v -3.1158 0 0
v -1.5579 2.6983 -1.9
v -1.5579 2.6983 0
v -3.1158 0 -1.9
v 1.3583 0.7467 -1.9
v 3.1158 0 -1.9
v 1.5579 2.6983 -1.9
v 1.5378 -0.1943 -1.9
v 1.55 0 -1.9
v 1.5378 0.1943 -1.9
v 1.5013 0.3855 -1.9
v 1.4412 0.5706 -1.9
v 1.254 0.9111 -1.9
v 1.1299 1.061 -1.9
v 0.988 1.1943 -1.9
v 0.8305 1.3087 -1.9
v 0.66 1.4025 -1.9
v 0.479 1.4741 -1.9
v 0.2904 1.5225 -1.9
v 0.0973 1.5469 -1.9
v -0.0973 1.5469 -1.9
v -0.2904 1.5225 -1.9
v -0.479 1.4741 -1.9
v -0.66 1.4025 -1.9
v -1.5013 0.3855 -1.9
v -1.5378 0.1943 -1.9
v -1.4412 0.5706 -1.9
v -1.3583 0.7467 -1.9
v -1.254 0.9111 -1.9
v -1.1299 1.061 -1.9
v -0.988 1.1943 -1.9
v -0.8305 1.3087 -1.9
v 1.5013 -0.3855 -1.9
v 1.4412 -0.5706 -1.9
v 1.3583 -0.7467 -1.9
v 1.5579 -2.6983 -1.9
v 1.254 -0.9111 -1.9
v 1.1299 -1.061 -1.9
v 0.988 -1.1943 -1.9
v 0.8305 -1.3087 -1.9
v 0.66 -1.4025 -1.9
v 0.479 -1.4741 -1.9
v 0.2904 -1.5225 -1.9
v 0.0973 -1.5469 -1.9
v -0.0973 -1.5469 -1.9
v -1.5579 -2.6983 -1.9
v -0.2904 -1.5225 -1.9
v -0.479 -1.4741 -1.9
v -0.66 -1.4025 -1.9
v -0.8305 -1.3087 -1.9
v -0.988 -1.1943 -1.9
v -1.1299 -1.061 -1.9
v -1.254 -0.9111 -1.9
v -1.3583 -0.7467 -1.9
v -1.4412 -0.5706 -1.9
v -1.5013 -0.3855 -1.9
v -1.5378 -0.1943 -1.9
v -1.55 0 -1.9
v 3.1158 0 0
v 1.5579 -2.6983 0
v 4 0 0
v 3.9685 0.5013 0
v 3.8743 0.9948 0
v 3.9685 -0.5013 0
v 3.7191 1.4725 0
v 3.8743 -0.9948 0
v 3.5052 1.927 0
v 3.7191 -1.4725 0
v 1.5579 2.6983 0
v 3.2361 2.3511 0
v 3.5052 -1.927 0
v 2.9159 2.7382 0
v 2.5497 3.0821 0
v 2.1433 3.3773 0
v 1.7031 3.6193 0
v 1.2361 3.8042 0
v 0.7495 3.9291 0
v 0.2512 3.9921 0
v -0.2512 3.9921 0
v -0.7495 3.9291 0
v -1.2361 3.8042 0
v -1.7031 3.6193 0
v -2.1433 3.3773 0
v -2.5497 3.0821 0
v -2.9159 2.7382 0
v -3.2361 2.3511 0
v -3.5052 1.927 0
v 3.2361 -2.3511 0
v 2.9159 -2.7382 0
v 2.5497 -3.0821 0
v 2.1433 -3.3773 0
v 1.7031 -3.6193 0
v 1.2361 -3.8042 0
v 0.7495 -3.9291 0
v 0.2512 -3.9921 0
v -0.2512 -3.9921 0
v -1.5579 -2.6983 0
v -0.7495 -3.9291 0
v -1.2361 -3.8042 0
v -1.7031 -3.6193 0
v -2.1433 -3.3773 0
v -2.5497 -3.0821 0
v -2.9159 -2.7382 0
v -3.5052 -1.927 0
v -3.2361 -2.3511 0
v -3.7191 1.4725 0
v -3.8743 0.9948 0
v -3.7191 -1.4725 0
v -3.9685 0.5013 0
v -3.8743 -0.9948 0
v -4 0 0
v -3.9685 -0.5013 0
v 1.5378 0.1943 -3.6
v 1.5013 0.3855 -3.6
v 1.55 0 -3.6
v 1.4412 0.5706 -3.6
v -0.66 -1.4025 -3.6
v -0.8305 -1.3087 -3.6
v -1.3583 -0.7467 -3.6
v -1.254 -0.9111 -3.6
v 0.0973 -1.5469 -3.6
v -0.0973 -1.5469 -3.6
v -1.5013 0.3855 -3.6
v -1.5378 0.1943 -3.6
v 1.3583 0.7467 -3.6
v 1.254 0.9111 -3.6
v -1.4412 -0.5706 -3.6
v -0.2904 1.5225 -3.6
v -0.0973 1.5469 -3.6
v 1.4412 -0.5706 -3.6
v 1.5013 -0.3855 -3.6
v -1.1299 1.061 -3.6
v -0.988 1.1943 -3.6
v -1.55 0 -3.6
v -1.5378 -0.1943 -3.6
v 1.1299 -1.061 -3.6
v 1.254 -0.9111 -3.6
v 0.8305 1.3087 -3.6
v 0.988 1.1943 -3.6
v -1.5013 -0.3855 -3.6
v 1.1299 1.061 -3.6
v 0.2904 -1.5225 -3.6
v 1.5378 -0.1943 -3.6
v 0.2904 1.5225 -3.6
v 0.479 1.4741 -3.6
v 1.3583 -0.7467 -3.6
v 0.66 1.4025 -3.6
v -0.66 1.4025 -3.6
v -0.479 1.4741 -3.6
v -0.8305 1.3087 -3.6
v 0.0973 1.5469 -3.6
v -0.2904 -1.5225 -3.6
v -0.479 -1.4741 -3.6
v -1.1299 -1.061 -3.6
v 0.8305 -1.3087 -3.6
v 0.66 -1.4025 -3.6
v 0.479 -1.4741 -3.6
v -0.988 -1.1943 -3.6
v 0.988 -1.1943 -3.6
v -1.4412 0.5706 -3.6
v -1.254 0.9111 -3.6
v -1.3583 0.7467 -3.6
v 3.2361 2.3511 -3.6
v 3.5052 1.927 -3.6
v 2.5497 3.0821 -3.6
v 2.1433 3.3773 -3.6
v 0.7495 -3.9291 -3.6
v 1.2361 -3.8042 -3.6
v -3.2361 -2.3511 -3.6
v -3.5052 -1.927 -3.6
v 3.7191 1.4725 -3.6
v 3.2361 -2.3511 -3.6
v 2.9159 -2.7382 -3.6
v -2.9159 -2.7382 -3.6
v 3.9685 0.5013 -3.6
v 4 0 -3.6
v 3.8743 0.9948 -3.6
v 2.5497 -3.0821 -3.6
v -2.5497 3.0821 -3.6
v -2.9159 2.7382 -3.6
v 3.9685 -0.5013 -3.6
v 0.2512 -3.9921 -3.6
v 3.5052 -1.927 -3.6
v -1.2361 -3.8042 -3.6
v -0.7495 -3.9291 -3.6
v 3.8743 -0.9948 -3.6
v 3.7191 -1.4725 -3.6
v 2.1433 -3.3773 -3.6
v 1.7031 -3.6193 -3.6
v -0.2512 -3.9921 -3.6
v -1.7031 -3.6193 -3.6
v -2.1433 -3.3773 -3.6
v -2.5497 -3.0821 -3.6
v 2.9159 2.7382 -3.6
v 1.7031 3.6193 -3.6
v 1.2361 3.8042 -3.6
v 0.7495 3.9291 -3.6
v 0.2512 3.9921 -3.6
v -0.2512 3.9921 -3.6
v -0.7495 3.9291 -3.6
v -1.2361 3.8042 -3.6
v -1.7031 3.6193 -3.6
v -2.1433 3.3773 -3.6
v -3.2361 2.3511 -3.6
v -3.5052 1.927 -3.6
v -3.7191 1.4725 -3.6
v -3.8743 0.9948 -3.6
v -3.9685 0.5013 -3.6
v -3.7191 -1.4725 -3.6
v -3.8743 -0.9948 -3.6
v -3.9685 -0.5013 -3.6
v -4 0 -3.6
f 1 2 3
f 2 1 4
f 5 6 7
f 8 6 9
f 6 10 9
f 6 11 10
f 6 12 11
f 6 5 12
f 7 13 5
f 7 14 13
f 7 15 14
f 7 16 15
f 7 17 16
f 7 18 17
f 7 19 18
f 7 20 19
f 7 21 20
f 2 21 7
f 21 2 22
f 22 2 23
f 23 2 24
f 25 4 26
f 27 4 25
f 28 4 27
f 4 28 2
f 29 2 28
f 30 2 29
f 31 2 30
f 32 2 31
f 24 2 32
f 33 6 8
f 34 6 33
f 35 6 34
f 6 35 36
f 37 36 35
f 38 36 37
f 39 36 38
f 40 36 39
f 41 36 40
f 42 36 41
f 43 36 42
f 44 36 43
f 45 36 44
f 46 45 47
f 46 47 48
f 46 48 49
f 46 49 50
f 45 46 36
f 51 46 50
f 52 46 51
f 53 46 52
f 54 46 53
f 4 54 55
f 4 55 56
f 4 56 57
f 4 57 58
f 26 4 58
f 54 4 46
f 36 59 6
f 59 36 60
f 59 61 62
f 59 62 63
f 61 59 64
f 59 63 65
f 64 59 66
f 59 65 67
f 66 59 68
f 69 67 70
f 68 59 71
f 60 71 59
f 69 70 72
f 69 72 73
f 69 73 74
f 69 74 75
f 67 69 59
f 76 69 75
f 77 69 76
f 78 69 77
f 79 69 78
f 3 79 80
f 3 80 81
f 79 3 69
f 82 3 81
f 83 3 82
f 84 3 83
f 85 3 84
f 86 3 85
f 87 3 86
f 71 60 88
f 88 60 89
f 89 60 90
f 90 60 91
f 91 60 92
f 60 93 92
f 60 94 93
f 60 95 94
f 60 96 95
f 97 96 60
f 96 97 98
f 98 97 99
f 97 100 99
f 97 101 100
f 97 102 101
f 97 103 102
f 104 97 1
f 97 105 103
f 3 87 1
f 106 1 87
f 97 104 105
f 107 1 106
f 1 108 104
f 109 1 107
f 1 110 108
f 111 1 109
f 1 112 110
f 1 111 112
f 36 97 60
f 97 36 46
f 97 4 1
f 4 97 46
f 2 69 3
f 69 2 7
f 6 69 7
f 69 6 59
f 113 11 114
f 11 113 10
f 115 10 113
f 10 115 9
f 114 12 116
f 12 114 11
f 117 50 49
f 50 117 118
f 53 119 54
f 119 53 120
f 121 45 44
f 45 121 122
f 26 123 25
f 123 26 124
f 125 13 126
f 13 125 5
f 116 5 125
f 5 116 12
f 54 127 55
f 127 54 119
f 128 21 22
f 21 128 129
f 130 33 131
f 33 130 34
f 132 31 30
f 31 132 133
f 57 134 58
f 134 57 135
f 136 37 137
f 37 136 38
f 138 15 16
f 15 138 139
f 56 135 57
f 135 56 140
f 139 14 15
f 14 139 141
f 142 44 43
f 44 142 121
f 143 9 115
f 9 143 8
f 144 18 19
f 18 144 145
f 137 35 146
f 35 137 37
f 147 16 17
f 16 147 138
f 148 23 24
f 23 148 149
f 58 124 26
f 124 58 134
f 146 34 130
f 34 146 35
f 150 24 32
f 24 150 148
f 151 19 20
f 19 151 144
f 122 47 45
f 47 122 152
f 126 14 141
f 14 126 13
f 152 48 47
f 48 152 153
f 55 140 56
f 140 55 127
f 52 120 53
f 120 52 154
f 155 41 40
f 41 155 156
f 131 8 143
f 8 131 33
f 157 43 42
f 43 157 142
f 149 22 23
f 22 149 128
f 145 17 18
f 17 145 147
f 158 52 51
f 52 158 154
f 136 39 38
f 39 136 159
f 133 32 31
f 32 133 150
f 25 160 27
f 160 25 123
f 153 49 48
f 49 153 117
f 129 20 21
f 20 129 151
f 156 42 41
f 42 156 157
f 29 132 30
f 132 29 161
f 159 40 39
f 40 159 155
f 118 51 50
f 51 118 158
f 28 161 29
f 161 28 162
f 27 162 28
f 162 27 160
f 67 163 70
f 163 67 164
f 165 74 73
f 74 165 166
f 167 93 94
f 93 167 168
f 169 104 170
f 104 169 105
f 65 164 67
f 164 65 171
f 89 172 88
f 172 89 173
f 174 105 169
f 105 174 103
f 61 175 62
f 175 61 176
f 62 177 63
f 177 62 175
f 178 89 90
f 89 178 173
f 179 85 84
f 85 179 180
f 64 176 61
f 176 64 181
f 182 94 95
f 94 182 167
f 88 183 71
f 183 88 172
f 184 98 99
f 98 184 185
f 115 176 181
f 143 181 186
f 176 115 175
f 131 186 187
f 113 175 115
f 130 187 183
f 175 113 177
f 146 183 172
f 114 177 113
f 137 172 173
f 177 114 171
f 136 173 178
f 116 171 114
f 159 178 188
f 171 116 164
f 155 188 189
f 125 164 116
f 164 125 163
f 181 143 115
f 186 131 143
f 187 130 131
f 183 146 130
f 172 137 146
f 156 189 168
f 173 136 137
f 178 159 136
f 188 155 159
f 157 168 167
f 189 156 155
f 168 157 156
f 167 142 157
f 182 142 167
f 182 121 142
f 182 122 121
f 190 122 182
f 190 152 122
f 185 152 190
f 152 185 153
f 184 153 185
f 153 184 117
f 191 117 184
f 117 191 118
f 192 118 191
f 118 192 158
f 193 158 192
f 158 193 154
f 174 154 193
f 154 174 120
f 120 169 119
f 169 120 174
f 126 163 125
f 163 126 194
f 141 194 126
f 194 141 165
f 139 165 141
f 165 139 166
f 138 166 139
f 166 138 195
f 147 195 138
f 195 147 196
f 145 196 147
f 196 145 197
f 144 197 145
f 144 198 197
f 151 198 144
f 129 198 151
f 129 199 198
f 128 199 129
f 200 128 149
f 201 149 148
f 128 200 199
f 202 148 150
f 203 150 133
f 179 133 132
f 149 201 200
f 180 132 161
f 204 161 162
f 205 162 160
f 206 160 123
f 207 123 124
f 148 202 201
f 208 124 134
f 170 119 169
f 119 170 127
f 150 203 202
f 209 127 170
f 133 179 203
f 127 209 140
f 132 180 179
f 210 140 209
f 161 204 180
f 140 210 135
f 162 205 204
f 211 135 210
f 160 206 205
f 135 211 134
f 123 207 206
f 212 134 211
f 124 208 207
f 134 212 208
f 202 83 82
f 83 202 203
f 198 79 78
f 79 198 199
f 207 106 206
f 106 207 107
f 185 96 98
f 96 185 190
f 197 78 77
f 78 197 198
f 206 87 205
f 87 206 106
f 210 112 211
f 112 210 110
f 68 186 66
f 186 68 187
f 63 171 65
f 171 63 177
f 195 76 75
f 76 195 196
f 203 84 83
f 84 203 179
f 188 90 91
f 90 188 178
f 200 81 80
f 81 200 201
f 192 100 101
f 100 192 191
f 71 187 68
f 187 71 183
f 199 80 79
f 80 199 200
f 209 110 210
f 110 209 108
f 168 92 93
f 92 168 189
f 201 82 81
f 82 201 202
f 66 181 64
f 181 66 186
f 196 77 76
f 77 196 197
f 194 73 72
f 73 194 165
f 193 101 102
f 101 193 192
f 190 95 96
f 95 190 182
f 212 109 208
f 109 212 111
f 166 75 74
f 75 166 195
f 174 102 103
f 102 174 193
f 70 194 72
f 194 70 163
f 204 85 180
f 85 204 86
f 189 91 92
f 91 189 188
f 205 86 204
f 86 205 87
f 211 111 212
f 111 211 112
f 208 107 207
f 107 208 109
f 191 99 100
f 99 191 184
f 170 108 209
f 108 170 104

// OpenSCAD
$fn = 50;

difference() {
	union() {
		translate(v = [0, 0, -3.6]) {
			cylinder(h = 3.6, r = 4.0);
		}
	}
	union() {
		translate(v = [0, 0, 0]) {
			rotate(a = [0, 0, 0]) {
				difference() {
					union() {
						translate(v = [0, 0, -1.9]) {
							linear_extrude(height = 1.9) {
								polygon(points = [[3.1158, 0.0], [1.5579000000000005, 2.698361953111554], [-1.5578999999999994, 2.6983619531115544], [-3.1158, 3.815754496783323e-16], [-1.5579000000000014, -2.6983619531115535], [1.557899999999998, -2.6983619531115552]]);
							}
						}
					}
					union();
				}
			}
		}
		#translate(v = [0, 0, -100.0]) {
			cylinder(h = 200, r = 1.55);
		}
	}
}
